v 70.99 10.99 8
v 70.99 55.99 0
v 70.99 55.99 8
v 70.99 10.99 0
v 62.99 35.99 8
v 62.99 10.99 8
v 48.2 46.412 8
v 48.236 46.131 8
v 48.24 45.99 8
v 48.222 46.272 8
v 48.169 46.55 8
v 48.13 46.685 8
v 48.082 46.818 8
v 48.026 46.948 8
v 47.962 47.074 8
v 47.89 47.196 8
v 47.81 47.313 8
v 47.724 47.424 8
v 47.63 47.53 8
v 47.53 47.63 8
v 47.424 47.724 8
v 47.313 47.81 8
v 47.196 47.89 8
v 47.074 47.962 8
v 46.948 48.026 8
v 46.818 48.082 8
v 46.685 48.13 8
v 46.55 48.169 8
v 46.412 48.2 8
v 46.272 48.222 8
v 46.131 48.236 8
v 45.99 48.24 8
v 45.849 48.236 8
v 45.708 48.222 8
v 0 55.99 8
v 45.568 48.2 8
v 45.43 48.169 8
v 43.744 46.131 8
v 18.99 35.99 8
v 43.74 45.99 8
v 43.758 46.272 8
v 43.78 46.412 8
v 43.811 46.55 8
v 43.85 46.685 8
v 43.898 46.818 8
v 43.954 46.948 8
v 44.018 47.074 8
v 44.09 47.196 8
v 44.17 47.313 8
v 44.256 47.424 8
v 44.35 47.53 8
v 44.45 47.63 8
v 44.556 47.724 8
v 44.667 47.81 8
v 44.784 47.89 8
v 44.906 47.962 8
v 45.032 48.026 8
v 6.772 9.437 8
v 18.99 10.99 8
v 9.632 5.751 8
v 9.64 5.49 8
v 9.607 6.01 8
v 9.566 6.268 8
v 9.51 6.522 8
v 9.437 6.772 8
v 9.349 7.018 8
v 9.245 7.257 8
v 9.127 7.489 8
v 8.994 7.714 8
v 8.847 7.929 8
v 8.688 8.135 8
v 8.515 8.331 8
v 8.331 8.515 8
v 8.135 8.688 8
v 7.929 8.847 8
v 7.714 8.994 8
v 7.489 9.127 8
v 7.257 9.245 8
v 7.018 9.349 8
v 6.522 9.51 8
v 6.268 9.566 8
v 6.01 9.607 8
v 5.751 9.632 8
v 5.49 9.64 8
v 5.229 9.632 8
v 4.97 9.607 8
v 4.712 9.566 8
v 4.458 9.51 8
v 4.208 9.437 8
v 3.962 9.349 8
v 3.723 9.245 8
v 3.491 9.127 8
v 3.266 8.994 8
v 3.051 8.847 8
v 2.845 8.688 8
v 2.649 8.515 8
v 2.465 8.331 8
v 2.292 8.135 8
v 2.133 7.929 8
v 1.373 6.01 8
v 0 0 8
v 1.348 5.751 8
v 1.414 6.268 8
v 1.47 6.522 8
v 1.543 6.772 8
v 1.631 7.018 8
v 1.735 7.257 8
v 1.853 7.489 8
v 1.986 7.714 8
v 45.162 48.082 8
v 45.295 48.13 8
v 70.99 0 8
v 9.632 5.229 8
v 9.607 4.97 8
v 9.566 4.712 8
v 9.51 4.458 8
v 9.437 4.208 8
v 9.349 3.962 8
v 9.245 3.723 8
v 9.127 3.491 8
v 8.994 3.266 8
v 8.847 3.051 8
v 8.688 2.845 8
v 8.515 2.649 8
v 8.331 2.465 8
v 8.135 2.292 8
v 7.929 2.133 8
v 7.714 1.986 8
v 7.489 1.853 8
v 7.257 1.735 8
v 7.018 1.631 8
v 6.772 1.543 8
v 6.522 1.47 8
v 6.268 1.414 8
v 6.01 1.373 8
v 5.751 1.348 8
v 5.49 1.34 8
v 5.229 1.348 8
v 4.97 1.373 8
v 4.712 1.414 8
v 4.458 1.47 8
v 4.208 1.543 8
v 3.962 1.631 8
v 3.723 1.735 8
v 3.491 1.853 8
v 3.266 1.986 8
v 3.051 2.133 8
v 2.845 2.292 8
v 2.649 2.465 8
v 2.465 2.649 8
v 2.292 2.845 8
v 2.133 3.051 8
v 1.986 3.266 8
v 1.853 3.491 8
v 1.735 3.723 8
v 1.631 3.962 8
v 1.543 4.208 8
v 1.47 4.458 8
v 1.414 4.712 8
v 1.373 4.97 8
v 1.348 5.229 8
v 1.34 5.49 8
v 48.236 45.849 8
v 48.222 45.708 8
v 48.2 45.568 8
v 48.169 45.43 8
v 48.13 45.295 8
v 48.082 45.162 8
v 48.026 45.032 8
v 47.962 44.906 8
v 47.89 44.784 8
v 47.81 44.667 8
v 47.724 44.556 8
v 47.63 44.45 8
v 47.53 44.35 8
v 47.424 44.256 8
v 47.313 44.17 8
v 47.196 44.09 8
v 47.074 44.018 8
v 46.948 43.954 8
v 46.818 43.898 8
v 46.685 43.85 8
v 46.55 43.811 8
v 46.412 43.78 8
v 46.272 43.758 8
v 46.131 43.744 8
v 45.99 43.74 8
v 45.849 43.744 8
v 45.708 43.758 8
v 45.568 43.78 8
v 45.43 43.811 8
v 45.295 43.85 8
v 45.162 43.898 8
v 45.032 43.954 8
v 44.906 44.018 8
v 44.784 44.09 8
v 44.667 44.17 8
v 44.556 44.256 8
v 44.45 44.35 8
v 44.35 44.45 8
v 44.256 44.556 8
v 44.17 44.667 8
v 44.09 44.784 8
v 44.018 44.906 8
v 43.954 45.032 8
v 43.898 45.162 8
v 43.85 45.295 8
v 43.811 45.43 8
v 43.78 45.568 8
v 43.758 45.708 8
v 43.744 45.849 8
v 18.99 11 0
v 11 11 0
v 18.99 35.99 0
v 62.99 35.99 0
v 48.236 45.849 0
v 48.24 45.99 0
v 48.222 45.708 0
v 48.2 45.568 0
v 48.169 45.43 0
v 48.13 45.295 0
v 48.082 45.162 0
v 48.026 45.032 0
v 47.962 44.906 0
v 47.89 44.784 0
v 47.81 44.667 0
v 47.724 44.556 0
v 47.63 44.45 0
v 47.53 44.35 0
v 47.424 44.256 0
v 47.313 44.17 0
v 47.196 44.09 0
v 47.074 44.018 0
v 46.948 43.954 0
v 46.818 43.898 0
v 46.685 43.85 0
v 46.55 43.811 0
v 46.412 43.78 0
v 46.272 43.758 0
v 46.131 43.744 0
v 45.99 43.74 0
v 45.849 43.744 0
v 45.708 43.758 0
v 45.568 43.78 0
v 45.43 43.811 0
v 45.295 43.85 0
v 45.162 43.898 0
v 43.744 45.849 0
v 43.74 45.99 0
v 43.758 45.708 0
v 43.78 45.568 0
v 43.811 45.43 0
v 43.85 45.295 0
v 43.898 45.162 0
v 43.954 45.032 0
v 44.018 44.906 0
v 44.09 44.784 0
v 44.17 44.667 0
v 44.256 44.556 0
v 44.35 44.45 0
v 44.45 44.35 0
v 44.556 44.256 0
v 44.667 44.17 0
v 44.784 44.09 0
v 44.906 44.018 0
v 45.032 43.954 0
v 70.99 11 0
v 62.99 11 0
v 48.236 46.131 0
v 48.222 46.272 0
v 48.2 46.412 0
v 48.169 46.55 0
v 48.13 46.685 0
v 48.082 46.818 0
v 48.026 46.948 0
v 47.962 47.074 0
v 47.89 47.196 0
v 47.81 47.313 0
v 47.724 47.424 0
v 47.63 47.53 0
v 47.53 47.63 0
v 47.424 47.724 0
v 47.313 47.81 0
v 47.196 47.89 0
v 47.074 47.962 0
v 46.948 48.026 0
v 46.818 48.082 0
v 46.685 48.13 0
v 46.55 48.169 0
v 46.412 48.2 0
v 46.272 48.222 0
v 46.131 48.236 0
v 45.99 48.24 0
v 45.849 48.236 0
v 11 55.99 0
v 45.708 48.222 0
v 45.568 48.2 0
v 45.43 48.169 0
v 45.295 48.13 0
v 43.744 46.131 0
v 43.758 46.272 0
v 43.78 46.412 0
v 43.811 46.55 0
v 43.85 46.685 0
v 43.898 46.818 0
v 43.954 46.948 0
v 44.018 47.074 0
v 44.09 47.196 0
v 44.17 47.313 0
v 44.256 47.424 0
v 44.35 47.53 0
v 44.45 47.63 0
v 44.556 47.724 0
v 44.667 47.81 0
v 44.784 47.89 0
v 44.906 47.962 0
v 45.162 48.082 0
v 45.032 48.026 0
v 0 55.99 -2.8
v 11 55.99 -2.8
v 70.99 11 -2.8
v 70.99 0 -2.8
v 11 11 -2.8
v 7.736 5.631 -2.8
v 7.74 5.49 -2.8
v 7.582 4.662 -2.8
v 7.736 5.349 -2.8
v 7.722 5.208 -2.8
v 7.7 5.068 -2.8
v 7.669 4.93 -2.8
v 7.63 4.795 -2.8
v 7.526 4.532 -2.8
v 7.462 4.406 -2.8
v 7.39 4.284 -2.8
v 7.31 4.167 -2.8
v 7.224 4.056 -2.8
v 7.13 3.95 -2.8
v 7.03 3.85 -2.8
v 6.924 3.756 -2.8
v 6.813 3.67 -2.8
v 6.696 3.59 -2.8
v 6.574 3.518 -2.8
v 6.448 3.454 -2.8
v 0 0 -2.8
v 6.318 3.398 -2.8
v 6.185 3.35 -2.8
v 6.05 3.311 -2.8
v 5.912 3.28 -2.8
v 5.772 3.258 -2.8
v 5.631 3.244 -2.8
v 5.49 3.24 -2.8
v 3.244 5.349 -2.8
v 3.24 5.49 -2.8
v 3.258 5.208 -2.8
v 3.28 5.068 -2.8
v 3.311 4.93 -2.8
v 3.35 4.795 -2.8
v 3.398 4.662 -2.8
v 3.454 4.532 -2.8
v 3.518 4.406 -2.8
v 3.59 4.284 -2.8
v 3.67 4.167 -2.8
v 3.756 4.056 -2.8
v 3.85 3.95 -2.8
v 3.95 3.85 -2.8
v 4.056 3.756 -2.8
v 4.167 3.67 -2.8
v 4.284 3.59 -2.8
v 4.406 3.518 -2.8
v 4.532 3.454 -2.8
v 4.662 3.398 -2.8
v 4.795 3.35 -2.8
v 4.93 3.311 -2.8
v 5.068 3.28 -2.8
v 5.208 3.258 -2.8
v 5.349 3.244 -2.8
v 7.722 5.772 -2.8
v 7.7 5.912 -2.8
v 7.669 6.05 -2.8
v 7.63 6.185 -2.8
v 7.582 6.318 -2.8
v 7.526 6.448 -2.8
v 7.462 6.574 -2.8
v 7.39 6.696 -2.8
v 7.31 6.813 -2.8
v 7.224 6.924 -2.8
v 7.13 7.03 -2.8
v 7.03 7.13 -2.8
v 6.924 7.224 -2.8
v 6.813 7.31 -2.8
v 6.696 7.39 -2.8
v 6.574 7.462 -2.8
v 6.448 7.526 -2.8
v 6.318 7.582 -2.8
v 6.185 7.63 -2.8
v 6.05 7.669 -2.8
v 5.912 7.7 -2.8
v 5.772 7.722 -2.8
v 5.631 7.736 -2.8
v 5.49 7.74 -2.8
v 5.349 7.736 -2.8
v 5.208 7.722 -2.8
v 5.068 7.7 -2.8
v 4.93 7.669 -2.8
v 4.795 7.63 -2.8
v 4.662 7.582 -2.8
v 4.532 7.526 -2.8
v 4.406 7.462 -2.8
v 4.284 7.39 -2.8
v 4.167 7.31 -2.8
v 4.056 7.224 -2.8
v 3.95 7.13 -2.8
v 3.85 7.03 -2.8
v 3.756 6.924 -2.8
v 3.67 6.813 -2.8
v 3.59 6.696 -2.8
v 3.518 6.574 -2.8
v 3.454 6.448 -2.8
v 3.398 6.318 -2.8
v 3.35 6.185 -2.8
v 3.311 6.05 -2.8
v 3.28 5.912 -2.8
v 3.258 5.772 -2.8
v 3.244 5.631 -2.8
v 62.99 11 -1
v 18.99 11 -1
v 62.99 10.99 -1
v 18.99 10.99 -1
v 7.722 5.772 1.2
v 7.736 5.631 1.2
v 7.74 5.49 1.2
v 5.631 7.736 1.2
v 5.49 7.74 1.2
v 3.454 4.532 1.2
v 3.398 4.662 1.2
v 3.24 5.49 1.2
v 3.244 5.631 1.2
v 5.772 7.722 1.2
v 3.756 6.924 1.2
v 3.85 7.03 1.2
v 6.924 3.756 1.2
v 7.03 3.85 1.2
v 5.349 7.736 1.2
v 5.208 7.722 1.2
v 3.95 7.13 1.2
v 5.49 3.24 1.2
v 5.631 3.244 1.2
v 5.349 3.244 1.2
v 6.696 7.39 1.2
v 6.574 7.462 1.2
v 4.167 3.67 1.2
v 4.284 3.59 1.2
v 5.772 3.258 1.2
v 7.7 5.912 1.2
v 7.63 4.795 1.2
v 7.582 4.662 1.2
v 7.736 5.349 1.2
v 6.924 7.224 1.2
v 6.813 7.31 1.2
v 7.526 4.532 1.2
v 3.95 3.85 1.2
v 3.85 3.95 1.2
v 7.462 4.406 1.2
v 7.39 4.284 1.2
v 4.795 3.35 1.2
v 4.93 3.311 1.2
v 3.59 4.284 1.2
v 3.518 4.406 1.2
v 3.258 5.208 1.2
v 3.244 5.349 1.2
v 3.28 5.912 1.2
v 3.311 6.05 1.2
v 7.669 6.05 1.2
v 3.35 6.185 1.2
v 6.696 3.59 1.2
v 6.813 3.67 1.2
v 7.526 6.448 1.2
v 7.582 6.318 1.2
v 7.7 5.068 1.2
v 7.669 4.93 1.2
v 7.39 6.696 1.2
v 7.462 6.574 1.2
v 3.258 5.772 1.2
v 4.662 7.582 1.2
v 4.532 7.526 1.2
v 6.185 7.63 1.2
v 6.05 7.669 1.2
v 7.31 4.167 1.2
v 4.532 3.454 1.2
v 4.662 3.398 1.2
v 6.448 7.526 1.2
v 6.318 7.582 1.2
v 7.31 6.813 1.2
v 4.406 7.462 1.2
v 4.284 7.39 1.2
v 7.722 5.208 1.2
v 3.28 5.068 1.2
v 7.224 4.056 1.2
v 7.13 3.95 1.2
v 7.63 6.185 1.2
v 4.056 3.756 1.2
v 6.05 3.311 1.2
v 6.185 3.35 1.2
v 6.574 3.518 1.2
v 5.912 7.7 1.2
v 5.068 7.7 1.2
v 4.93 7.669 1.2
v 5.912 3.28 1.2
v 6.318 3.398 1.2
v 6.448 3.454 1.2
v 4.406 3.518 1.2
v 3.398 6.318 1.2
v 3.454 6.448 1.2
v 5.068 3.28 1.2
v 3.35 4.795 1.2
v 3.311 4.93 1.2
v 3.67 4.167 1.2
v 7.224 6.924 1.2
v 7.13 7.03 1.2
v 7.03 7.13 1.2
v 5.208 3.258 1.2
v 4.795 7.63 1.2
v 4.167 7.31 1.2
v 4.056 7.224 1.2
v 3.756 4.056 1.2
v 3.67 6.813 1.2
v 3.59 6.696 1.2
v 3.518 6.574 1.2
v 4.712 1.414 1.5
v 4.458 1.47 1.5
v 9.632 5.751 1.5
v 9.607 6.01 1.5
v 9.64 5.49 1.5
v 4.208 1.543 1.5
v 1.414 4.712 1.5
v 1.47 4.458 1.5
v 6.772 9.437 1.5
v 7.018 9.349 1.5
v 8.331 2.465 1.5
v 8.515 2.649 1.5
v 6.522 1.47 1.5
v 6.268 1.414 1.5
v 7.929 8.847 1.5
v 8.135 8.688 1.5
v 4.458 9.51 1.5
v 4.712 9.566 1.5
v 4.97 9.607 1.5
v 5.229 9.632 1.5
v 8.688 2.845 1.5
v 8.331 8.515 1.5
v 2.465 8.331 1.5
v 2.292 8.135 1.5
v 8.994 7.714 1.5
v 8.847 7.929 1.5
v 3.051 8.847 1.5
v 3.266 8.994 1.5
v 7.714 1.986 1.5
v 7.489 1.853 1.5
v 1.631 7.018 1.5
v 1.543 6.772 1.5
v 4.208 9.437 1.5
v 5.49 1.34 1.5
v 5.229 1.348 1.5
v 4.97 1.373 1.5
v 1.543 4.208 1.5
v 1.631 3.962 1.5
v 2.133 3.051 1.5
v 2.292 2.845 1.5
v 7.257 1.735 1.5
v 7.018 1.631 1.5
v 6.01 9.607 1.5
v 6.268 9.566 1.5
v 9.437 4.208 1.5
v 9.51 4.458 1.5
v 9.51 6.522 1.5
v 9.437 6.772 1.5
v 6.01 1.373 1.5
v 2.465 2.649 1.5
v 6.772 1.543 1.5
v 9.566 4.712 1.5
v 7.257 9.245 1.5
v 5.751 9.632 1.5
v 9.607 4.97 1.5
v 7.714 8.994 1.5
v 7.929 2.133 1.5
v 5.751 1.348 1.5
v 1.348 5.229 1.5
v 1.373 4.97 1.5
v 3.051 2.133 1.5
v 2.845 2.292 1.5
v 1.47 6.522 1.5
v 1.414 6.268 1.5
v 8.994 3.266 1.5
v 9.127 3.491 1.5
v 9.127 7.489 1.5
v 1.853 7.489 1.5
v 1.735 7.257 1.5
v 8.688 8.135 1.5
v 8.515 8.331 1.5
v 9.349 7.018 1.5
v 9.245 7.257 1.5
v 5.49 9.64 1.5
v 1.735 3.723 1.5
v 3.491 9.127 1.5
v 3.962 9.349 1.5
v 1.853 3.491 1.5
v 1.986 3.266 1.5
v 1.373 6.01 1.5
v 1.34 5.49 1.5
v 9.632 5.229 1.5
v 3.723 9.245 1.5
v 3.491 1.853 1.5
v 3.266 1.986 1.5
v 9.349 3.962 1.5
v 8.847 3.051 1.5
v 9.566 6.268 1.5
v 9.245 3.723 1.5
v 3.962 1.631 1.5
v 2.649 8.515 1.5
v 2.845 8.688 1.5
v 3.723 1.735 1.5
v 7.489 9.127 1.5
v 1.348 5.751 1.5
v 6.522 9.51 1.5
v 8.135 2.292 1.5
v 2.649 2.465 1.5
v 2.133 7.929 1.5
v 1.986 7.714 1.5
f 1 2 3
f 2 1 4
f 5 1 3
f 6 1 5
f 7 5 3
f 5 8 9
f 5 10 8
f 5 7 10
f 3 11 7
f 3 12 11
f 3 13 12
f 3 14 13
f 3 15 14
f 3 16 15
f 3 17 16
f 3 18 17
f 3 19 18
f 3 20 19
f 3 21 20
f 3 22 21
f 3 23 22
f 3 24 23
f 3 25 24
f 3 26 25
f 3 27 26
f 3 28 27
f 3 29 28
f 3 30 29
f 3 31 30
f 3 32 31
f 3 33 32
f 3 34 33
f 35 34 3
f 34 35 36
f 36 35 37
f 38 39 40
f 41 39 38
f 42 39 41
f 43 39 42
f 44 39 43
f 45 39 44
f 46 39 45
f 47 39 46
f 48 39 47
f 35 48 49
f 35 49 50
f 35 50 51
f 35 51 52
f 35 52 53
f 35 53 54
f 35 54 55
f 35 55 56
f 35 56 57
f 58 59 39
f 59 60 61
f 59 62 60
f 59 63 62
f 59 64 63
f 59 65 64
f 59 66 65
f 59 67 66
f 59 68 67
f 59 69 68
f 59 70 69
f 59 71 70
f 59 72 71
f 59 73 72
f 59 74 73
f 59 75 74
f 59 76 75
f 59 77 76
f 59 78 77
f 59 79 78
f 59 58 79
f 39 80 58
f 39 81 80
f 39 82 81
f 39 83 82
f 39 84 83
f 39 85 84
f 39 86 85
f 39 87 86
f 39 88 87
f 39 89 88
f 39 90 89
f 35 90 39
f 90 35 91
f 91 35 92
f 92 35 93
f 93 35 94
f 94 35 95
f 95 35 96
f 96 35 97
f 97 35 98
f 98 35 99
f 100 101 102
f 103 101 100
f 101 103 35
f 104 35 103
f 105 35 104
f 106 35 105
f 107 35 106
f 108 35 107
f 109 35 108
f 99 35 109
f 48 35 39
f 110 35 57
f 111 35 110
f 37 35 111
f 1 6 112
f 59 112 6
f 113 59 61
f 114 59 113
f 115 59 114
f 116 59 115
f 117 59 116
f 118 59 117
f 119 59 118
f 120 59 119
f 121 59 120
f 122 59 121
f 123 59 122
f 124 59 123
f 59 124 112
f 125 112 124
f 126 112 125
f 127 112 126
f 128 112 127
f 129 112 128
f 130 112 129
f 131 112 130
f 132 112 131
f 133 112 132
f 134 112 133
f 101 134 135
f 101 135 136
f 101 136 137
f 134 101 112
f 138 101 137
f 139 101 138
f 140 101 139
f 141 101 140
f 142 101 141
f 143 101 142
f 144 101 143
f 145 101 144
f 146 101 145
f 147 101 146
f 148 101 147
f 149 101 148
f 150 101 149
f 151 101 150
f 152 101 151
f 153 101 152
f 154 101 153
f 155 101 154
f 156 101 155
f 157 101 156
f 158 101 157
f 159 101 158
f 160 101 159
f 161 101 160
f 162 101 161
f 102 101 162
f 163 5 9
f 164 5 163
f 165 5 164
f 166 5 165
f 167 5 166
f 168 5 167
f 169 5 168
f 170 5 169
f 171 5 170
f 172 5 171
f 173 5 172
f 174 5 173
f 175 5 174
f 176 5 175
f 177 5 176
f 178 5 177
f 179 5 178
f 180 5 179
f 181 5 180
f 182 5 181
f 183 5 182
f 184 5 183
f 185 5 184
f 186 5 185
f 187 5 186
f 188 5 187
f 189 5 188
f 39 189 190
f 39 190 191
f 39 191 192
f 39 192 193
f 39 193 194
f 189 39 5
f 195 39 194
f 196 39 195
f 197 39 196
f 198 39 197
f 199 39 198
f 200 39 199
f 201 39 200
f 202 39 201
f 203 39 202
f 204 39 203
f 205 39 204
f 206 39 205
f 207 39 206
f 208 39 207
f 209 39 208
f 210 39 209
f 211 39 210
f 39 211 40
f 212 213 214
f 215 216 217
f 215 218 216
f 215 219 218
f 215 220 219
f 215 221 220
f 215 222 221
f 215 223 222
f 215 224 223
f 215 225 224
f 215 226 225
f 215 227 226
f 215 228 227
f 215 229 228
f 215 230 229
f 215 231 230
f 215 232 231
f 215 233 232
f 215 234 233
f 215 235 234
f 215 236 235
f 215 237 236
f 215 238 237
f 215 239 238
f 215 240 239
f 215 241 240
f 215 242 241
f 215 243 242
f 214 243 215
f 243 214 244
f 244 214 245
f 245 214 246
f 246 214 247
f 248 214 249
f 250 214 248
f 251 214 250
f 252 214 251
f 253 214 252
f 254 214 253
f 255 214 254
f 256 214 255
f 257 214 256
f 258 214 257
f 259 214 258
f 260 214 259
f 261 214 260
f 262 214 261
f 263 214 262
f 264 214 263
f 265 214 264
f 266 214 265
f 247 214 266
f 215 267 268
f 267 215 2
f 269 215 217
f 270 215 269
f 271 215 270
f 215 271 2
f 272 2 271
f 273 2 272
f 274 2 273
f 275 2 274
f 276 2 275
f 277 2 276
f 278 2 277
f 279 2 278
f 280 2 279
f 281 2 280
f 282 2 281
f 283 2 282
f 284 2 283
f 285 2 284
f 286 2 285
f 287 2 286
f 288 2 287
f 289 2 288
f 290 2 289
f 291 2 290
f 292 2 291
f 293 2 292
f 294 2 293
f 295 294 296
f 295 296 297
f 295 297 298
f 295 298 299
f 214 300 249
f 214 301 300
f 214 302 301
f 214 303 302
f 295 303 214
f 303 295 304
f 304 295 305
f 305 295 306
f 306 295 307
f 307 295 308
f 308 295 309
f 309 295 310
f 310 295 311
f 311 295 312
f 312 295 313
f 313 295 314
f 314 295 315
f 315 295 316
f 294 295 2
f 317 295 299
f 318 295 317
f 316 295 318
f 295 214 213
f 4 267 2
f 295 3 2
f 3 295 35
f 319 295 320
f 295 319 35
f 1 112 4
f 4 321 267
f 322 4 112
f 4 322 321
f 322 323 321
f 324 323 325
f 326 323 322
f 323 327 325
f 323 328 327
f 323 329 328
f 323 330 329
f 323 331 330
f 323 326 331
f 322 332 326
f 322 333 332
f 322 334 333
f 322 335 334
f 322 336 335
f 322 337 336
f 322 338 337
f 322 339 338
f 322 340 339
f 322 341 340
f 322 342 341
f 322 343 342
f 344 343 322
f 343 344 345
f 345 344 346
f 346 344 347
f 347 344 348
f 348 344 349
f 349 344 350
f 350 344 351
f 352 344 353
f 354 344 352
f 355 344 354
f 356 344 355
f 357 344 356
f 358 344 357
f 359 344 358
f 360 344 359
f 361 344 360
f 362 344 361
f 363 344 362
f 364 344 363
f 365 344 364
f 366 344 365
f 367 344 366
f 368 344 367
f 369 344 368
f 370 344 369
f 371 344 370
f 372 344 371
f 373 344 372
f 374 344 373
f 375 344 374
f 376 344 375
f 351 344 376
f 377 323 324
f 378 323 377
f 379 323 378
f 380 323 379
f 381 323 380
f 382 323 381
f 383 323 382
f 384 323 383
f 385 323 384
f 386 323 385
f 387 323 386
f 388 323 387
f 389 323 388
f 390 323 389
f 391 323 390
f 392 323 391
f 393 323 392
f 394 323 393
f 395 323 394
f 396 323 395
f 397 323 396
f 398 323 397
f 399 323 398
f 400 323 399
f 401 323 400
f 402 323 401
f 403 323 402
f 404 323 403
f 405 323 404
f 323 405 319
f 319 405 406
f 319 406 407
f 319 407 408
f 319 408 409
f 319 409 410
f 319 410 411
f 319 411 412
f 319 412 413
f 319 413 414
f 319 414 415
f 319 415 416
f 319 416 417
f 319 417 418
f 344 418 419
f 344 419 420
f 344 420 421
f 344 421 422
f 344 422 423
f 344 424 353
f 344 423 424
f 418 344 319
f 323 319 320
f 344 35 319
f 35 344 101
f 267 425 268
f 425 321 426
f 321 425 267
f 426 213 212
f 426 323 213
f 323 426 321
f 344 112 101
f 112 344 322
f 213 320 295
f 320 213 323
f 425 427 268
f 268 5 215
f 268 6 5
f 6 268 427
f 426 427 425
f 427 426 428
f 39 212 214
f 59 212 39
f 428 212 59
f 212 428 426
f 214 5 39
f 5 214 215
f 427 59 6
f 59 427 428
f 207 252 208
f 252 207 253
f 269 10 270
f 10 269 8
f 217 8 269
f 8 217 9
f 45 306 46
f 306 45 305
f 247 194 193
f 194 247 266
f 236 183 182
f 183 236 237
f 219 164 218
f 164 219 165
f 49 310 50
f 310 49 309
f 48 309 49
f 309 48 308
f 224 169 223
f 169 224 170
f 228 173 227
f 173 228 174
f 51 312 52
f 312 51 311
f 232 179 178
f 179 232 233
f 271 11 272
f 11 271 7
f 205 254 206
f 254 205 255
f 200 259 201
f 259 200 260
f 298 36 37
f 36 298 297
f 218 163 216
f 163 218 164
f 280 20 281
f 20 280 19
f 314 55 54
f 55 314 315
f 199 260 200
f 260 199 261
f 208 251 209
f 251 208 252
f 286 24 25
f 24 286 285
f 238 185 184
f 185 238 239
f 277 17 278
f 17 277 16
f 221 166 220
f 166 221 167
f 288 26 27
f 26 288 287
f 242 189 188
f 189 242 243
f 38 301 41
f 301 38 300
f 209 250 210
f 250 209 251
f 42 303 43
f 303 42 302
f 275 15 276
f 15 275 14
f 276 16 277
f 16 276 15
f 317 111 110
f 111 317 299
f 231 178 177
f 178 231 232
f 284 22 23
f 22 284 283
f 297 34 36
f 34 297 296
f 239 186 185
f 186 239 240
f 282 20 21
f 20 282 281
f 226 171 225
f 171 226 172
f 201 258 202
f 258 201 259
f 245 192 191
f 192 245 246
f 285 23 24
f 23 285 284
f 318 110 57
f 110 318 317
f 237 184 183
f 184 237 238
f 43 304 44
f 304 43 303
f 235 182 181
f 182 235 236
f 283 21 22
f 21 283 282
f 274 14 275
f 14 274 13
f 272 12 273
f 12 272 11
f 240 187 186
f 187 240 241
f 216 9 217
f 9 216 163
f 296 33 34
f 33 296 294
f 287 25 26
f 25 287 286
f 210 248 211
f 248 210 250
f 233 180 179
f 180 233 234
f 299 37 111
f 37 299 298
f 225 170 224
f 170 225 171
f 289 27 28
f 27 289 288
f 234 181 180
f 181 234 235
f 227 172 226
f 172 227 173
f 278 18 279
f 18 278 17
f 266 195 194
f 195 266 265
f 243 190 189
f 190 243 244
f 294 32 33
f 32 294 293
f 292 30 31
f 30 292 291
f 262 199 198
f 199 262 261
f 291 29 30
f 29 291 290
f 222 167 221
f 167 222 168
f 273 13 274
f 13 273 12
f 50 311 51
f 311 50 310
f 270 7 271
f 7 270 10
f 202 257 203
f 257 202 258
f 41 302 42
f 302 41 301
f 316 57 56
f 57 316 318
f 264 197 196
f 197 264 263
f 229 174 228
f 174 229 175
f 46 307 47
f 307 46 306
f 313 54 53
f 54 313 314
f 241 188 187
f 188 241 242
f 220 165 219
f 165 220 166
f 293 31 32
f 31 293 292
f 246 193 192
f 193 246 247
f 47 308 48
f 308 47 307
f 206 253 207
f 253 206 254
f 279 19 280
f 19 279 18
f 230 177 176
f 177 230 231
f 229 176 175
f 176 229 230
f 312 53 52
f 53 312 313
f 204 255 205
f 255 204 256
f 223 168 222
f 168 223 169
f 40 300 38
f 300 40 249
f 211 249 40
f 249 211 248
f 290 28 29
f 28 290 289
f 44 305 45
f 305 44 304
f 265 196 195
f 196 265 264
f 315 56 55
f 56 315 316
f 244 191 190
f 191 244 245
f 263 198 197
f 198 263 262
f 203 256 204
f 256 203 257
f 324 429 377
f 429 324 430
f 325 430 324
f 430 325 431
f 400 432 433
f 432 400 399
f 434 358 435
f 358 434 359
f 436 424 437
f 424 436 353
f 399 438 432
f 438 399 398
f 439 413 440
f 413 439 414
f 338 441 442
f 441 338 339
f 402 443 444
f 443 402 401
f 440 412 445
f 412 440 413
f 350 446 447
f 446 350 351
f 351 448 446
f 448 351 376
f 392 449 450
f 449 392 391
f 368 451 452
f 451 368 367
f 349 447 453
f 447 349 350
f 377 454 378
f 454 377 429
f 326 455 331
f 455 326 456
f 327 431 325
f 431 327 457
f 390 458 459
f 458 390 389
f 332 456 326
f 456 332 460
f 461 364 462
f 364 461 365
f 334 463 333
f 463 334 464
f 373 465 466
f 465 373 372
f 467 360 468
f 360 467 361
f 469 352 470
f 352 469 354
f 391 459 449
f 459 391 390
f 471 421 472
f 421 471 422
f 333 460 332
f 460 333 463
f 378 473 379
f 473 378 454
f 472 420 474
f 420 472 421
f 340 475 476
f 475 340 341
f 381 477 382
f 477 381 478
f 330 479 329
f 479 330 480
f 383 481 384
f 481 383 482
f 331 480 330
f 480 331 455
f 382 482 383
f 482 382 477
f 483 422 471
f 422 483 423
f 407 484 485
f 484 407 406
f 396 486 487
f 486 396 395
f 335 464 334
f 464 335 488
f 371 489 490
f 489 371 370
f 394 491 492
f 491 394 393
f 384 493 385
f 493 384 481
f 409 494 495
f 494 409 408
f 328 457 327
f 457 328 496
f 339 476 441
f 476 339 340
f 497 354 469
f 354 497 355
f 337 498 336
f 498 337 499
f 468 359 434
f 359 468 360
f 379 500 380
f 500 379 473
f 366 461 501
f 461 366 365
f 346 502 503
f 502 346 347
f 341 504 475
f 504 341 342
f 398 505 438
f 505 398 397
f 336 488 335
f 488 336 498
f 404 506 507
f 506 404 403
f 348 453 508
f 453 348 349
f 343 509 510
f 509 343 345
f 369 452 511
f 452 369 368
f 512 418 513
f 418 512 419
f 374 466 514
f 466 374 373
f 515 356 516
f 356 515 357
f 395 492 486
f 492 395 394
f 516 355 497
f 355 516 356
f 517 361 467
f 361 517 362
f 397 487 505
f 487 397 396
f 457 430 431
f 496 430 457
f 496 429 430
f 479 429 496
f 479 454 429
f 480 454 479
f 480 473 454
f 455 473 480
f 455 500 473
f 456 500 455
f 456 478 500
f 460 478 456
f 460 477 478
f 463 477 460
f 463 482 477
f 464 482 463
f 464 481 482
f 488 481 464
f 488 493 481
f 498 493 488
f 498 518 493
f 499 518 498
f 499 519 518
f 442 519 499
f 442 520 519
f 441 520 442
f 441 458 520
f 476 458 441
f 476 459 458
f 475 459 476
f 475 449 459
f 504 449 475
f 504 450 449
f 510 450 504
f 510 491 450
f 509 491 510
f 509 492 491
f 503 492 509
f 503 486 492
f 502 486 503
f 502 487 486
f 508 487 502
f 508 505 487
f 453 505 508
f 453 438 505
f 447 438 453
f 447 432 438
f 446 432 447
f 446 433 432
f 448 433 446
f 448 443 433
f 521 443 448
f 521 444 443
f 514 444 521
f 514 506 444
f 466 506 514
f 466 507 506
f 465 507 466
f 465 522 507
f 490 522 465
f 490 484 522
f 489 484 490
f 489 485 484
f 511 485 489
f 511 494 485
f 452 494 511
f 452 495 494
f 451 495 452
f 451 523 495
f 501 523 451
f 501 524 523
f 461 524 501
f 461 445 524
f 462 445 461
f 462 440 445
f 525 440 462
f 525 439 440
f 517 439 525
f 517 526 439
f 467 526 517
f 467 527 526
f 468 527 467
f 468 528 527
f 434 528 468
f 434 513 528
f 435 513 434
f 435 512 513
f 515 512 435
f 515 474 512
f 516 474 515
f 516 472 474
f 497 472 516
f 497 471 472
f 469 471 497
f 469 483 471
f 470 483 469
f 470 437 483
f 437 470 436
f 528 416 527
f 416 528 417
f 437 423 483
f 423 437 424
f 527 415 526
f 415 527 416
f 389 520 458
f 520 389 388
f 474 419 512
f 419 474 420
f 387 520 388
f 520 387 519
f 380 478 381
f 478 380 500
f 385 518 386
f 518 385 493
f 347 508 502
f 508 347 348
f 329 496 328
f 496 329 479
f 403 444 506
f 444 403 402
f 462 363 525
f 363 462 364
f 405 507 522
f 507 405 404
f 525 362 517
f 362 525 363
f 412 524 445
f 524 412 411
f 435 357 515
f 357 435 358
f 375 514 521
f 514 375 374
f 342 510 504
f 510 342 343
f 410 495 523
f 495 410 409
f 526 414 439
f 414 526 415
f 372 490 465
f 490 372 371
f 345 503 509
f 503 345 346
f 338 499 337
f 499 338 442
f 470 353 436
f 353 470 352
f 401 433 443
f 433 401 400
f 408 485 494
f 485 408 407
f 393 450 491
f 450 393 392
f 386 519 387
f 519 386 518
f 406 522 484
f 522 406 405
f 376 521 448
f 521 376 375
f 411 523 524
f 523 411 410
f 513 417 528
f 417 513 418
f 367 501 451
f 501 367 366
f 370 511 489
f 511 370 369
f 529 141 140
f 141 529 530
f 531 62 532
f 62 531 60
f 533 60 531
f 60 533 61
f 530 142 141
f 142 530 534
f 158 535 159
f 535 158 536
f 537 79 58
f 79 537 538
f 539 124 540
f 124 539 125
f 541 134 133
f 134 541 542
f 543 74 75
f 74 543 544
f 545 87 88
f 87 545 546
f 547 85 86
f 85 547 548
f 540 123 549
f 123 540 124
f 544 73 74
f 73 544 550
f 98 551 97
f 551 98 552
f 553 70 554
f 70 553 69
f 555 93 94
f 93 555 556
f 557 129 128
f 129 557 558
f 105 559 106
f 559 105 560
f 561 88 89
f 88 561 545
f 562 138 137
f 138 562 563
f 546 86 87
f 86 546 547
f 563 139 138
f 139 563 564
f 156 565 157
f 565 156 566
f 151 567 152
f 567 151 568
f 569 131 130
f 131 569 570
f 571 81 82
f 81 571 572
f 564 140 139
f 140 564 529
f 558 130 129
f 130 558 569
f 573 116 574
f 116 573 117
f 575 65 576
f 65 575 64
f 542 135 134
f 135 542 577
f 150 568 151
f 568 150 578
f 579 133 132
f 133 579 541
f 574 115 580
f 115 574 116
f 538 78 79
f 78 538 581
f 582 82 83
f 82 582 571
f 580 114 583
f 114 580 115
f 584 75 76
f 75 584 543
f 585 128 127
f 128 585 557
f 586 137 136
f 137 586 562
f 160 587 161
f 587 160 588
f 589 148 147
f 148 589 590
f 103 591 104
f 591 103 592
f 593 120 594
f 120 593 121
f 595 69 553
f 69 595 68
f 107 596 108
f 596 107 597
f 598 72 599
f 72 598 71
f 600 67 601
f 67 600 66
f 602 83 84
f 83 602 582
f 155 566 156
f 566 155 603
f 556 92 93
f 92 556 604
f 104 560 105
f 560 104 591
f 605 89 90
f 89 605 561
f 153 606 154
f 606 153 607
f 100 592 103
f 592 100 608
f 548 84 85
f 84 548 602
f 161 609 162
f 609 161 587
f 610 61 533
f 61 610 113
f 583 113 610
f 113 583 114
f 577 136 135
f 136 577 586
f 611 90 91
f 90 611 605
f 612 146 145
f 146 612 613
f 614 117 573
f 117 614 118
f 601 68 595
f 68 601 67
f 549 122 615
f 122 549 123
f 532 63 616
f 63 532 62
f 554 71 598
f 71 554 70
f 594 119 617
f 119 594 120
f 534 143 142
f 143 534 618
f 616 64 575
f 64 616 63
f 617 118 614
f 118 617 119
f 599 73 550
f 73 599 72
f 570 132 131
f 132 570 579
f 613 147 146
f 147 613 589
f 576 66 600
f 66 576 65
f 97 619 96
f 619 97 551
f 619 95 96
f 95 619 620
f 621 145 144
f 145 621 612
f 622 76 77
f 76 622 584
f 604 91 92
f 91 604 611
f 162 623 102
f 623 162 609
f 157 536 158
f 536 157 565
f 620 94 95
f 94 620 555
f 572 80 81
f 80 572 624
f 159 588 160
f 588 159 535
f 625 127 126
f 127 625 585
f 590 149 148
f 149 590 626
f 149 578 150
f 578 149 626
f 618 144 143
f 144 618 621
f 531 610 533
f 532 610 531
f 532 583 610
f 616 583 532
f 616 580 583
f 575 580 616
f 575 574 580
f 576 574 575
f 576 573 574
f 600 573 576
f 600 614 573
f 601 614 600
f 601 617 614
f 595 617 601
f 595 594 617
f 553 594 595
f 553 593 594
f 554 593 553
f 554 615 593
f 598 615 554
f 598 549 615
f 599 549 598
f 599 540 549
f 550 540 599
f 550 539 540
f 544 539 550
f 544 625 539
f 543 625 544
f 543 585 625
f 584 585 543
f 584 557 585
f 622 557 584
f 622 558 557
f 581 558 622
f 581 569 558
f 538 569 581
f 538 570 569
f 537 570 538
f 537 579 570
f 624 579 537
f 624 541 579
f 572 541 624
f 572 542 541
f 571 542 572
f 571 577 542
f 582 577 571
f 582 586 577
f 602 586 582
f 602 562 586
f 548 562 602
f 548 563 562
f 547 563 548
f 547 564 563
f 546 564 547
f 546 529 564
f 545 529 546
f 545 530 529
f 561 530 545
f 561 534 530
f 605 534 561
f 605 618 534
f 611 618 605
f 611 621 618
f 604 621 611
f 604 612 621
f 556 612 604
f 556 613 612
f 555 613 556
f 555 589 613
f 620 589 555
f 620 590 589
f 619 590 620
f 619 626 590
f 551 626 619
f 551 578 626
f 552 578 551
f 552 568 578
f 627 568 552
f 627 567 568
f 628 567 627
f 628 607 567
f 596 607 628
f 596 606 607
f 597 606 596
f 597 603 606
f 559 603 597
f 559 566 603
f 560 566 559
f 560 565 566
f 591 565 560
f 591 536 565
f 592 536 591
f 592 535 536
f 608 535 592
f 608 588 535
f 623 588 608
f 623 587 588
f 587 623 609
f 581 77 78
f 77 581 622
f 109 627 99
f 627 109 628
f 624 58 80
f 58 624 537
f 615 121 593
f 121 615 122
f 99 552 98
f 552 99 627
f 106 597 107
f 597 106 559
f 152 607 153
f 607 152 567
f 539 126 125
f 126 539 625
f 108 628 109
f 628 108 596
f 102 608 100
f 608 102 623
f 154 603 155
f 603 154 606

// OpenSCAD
hb_thick = 8;
hb_x = 60;
hb_y = 45;
hb_overlap = 2.8;
corner_size = 11;

screw_size = 4.5;
screw_offset = 35;
spring_hole = 8.3;

module hb_corner() {
	
		translate([corner_size-0.01, corner_size-0.01, 0]) difference() {
			union() {
				cube(size=[hb_x, hb_y, hb_thick]);
				translate([-corner_size+0.01, -corner_size+0.01, -hb_overlap]) cube(size=[hb_x+corner_size-0.01, corner_size, hb_thick+hb_overlap]);
				translate([-corner_size+0.01, -corner_size+0.01, -hb_overlap]) cube(size=[corner_size, corner_size+hb_y-0.01, hb_thick+hb_overlap]);
			}
			translate([hb_thick, 0, -1]) cube(size=[hb_x-2*hb_thick, hb_y-20, hb_thick+2]);
			translate([screw_offset, screw_offset, -1]) cylinder(d=screw_size, h=hb_thick+2, $fn=100);

			// spring hole
			translate([-corner_size/2, -corner_size/2, -hb_overlap-1]) cylinder(d=screw_size, h=1+hb_thick/2, $fn=100);
			translate([-corner_size/2, -corner_size/2, -hb_overlap+hb_thick/2+0.3]) cylinder(d=spring_hole, h=hb_thick, $fn=100);

		}
	
}

hb_corner(); // top right / bottom left
//mirror([1, 0, 0]) hb_corner(); // top left / bottom right
